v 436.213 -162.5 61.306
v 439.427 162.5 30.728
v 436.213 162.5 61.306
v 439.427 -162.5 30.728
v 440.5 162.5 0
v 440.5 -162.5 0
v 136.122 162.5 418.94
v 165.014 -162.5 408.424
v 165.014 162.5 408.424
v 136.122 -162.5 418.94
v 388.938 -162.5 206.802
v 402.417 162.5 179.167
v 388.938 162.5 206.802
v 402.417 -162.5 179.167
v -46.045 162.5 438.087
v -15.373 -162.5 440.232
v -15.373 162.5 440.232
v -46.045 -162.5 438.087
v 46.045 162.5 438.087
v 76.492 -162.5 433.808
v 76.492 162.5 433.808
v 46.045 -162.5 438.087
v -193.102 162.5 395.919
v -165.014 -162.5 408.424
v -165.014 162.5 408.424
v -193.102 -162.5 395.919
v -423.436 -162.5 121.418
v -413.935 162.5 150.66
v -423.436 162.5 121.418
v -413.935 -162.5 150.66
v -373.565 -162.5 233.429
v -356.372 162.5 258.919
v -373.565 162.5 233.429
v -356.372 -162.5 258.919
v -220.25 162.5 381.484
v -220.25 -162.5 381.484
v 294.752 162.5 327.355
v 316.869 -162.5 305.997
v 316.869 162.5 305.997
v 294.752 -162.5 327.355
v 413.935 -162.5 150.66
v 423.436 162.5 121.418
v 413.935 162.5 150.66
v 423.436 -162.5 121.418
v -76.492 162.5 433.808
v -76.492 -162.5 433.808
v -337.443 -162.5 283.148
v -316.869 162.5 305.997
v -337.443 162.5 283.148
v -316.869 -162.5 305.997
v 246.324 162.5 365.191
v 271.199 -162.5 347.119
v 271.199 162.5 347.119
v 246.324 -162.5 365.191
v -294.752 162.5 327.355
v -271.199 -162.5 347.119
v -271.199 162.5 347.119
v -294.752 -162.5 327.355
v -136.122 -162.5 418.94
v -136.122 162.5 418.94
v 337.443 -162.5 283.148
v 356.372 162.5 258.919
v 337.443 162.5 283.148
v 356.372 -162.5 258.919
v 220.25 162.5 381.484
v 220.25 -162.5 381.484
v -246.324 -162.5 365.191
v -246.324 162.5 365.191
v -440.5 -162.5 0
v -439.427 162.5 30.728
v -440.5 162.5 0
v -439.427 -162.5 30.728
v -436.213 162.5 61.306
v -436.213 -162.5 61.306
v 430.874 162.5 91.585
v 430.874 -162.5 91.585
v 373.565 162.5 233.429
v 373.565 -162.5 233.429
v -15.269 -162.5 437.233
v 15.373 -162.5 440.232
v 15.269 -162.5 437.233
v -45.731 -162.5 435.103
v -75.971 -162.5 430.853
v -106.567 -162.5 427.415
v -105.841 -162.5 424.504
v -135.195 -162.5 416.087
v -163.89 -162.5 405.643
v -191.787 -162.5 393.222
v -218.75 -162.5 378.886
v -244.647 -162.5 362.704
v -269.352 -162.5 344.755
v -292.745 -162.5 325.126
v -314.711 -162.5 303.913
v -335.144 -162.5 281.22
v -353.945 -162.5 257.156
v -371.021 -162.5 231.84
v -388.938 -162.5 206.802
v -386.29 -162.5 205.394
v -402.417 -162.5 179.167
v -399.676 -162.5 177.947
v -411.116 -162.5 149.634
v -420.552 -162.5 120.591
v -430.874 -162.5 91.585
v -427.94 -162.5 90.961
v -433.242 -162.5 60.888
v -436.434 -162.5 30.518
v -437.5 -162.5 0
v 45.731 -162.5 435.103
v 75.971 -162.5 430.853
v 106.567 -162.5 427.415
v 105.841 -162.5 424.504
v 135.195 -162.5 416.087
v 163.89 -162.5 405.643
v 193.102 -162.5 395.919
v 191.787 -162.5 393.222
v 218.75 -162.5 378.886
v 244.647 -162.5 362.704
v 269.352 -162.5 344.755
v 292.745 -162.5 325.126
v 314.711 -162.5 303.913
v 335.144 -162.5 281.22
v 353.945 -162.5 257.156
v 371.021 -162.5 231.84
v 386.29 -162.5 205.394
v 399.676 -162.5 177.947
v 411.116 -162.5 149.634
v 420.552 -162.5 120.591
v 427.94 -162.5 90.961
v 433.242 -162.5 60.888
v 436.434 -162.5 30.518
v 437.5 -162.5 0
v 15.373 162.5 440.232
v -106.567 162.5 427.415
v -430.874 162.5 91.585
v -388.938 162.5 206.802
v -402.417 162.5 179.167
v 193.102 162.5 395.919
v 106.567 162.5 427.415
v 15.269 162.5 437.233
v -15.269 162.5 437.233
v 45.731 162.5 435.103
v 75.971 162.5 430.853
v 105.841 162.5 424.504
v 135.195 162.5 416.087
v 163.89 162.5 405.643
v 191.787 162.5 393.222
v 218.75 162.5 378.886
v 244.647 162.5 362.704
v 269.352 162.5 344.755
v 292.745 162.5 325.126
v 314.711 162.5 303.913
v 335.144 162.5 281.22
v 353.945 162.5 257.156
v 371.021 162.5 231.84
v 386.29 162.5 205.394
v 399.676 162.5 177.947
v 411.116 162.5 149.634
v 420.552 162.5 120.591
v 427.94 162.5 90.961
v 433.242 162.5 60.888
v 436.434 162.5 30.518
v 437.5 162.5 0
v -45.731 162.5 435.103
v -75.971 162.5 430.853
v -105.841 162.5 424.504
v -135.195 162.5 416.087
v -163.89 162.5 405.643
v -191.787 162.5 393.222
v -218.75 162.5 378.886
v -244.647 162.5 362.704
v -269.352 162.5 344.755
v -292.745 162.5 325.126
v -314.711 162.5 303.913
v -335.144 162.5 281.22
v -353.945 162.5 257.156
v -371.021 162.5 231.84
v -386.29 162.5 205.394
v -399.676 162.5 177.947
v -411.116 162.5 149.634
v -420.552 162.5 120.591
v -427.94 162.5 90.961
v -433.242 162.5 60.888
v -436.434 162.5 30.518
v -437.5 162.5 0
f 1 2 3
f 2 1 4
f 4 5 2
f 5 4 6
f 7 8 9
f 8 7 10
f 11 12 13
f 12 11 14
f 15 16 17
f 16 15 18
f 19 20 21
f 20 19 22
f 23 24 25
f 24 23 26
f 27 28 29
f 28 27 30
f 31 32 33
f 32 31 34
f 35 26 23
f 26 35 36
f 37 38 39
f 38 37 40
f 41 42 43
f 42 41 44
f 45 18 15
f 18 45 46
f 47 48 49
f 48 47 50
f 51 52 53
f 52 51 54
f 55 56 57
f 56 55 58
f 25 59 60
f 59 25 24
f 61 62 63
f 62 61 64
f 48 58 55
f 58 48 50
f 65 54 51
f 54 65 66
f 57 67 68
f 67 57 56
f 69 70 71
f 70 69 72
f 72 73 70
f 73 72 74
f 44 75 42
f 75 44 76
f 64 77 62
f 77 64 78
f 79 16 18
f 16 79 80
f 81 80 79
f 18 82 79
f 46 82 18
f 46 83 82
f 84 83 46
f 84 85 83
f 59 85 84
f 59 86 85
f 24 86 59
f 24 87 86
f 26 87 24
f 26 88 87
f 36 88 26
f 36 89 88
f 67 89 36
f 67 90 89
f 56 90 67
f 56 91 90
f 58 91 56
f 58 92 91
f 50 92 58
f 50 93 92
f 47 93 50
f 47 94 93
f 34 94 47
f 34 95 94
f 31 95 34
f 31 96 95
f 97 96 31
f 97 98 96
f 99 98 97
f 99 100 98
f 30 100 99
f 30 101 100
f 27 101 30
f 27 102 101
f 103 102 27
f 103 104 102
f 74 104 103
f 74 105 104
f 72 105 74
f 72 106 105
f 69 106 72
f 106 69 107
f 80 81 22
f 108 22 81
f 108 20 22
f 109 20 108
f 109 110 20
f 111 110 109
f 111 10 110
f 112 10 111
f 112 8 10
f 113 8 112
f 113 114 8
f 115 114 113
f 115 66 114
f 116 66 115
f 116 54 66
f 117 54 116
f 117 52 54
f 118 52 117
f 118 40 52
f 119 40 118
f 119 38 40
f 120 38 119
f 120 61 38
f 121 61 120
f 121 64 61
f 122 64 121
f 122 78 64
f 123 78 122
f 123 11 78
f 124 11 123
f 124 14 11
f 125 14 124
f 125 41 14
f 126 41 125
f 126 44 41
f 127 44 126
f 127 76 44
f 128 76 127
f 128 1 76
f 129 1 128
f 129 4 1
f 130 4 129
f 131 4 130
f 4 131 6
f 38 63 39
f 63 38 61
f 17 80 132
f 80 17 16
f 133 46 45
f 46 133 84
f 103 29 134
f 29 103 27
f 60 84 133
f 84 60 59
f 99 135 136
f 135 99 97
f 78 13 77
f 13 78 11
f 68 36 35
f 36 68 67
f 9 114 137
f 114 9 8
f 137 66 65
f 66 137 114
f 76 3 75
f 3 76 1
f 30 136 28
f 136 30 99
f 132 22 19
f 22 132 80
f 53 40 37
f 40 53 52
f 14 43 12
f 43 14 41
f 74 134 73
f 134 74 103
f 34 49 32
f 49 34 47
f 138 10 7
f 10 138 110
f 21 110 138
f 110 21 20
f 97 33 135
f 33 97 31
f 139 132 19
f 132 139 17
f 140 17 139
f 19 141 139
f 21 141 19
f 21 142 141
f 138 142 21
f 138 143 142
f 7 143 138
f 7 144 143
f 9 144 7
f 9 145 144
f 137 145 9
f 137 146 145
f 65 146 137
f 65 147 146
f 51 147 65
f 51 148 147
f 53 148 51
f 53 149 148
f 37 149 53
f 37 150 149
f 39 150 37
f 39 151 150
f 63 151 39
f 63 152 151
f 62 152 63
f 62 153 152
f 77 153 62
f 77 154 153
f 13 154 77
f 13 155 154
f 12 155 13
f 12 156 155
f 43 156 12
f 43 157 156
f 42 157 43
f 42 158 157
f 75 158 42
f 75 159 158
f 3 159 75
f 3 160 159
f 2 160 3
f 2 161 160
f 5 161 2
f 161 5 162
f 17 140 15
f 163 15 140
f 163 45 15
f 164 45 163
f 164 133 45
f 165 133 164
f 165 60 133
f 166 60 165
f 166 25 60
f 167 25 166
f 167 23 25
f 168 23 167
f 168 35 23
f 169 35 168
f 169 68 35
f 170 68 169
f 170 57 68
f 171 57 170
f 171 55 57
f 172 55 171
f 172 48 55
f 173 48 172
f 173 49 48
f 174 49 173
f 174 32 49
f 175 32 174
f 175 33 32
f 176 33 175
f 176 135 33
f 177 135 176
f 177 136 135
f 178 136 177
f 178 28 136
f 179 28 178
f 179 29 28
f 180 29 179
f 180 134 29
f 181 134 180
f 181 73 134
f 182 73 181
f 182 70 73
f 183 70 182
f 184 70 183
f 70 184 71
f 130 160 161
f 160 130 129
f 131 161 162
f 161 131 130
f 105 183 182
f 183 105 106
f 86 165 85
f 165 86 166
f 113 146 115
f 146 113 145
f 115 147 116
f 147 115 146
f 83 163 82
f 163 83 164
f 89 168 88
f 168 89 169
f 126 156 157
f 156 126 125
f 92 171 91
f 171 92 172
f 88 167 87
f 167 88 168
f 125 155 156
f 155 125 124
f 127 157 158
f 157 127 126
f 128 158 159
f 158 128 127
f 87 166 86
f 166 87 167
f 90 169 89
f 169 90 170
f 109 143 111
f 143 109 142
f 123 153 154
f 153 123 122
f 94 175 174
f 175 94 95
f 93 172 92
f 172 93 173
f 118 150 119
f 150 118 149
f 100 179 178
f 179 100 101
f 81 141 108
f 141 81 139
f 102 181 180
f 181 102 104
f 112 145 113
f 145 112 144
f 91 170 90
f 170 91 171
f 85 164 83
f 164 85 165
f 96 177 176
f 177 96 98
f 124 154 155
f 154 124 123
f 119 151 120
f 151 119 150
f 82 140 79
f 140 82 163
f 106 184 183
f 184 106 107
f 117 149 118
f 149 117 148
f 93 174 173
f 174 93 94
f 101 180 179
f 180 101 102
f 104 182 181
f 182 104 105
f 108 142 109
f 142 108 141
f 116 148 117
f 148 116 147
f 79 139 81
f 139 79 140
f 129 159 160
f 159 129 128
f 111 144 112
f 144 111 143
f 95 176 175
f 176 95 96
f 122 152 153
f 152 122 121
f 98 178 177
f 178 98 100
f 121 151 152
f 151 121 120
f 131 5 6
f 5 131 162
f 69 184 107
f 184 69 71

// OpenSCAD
/*
 * Offroad Adventure Trailer - Fender / Mudguard (registration requirement)
 *
 * Half-round fender over a 265/60R18 wheel, bent from 3 mm aluminum
 * tread plate (same stock as the water tank skid plate).
 * Origin = wheel center; fender width along Y.
 */

$fn = 90;

module fender(
    tire_dia = 775,
    tire_w = 265,
    clearance = 50,     // radial gap to the tire (suspension travel!)
    thickness = 3,
    overhang = 60       // extra width beyond the tire
) {
    r_i = tire_dia/2 + clearance;
    r_o = r_i + thickness;
    w = tire_w + overhang;

    color([0.1, 0.1, 0.1])
    rotate([90, 0, 0])
    difference() {
        cylinder(r=r_o, h=w, center=true);
        cylinder(r=r_i, h=w + 2, center=true);
        // Keep only the top half (open toward the ground)
        translate([-r_o - 1, -r_o - 1, -w/2 - 1])
            cube([2*r_o + 2, r_o + 1, w + 2]);
    }
}

// Renders if the file is opened standalone (with a ghost wheel)
fender();
%rotate([90, 0, 0]) cylinder(d=775, h=265, center=true);
